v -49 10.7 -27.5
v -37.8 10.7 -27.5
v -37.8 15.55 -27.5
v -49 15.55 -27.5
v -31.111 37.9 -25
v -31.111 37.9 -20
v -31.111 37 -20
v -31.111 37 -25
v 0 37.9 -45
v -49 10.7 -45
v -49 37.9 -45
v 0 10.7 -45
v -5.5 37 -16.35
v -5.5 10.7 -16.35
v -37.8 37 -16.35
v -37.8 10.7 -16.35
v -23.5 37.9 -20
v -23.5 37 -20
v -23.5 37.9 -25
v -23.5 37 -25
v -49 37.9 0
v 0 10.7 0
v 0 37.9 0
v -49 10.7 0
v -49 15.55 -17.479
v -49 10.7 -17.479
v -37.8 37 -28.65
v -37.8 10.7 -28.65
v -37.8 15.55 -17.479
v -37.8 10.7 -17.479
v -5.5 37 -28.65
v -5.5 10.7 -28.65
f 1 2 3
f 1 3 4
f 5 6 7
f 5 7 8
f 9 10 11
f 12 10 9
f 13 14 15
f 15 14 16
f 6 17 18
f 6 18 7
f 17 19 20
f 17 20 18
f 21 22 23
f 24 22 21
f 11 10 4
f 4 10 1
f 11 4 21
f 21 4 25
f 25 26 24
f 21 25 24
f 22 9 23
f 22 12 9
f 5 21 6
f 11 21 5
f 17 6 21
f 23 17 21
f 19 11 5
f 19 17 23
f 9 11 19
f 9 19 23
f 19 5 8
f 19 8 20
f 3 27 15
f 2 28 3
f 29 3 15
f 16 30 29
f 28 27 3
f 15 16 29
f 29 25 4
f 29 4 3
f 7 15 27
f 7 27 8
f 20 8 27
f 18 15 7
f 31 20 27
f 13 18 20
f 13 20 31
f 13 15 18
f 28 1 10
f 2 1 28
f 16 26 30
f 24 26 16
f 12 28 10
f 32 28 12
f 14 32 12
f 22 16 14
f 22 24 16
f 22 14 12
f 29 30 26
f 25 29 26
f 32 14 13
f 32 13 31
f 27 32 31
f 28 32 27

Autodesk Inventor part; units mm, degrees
ref_plane "YZ Plane" through (0, 0, 0) normal (1, 0, 0) x (0, 1, 0)
ref_plane "XZ Plane" through (0, 0, 0) normal (0, 1, 0) x (-1, 0, 0)
ref_plane "XY Plane" through (0, 0, 0) normal (0, 0, 1) x (1, 0, 0)
sketch "Szkic1" plane through (0, 0, 0) normal (0, 1, 0) x (-1, 0, 0)
  line L0 (0, 0) -> (49, 0)
  line L1 (49, 0) -> (49, -45)
  line L2 (49, -45) -> (0, -45)
  line L3 (0, -45) -> (0, 0)
  line L4 (49, 0) -> (49, 3)
  line L5 (49, 3) -> (52, 3)
  line L6 (0, -45) -> (0, -48)
  line L7 (0, -48) -> (-3, -48)
  line L8 (-3, -48) -> (52, -48)
  line L9 (52, -48) -> (52, 3)
  line L10 (52, 3) -> (-3, 3)
  line L11 (-3, 3) -> (-3, -48)
  line L12 (0, -48) -> (-29.5685, -48)
  line L13 (-29.5685, -48) -> (-29.5685, 3)
  line L14 (-29.5685, 3) -> (0, 3)
  line L15 (0, 3) -> (0, -48)
  line L16 (-3, -45) -> (-29.5685, -45)
  line L17 (-3, 0) -> (-29.5685, 0)
  line L18 (-3, 0) -> (0, 0)
  line L19 (0, -45) -> (-3, -45)
  line L20 (-3, -45) -> (-3, -48)
  line L21 (0, -48) -> (0, -45)
  line L22 (0, -48) -> (-3, -48)
  dimension "d0" = 49
  dimension "d1" = 45
  dimension "d2" = 3
  dimension "d3" = 3
  dimension "d4" = 3
  dimension "d5" = 3
extrude "Wyciągnięcie proste1" add sketch "Szkic1" along normal blind 37.2 contours L0 L1 L2 L3 | L3 L19 L11 L18 | L11 L16 L13 L17
sketch "Szkic2" plane through (0, 0, 0) normal (0, -1, 0) x (1, 0, 0)
  line L0 (-49, 0) -> (0, 0) projected
  line L1 (-24.5, 0) -> (-24.5, -45)
  line L2 (0, -45) -> (-49, -45) projected
  line L3 (-49, -45) -> (-49, 0) projected
  line L4 (-49, -22.5) -> (0, -22.5)
  line L5 (0, 0) -> (0, -45) projected
  circle A0 centre (-24.5, -22.5) radius 2.85
  circle A1 centre (-24.5, -22.5) radius 3
  dimension "d8" = 5.7
  dimension "d27" = 6
extrude "Wyciągnięcie proste2" cut sketch "Szkic2" against normal through all contours A1 L4 A0 L1 | L1 A0 L4 A1 | L4 A0 L1 A1 | A0 L4 L1 | L1 L4 A0 | A1 L1 A0 L4 | L4 L1 A0 | L4 A0 L1
sketch "Szkic3" plane through (0, 0, 0) normal (0, -1, 0) x (1, 0, 0)
  circle A0 centre (-24.5, -22.5) radius 2.85 projected
  line L0 (-24.5, -22.5) -> (-37.8, -22.5)
  line L1 (-24.5, -22.5) -> (9, -22.5)
  line L2 (-37.8, -22.5) -> (9, -22.5)
  line L3 (9, -22.5) -> (9, -32.4)
  line L4 (9, -32.4) -> (-37.8, -32.4)
  line L5 (-37.8, -32.4) -> (-37.8, -22.5)
  line L6 (9, -22.5) -> (-37.8, -22.5)
  line L7 (-37.8, -22.5) -> (-37.8, -13.6)
  line L8 (-37.8, -13.6) -> (9, -13.6)
  line L9 (9, -13.6) -> (9, -22.5)
  line L10 (9, -32.4) -> (-37.8, -32.4)
  line L11 (9, -32.4) -> (13, -32.4)
  line L12 (-37.8, -13.6) -> (-41.8, -13.6)
  line L13 (13, -32.4) -> (13, -32.9)
  line L14 (-41.8, -13.6) -> (-41.8, -13)
  line L15 (13, -32.4) -> (13, -33)
  line L16 (-41.8, -13) -> (-42.5873, -13)
  line L17 (13, -33) -> (13.5, -33)
  line L18 (13.5, -33) -> (-42.5873, -33)
  line L19 (-42.5873, -33) -> (-42.5873, -13)
  line L20 (-42.5873, -13) -> (13.5, -13)
  line L21 (13.5, -13) -> (13.5, -33)
  line L22 (13.5, -13) -> (-6.5, -13)
  line L23 (-6.5, -13) -> (-6.5, -32.4)
  line L24 (-6.5, -32.4) -> (13.5, -32.4)
  line L25 (13.5, -32.4) -> (13.5, -13)
  line L26 (-37.8, -22.5) -> (-6.5, -22.5)
  line L27 (-6.5, -22.5) -> (-6.5, -16.35)
  line L28 (-6.5, -16.35) -> (-37.8, -16.35)
  line L29 (-37.8, -16.35) -> (-37.8, -22.5)
  line L30 (-37.8, -22.5) -> (-6.5, -22.5)
  line L31 (-6.5, -22.5) -> (-6.5, -28.65)
  line L32 (-6.5, -28.65) -> (-37.8, -28.65)
  line L33 (-37.8, -28.65) -> (-37.8, -22.5)
  line L34 (-6.5, -16.35) -> (-5.5, -16.35)
  line L35 (-5.5, -16.35) -> (-5.5, -28.65)
  line L36 (-5.5, -28.65) -> (-6.5, -28.65)
  line L37 (-6.5, -28.65) -> (-6.5, -16.35)
  line L38 (-37.8, -22.5) -> (-26.4, -22.5)
  line L39 (-24.5, -22.5) -> (-26.9, -22.5)
  circle A1 centre (-26.9, -22.5) radius 2.4
  point P0 (0, 0)
  dimension "d21" = 4
  dimension "d22" = 4
  dimension "d23" = 0.5
  dimension "d24" = 0.6
  dimension "d25" = 0.6
  dimension "d26" = 0.5
  dimension "d28" = 20
  dimension "d29" = 6.15
  dimension "d30" = 6.15
  dimension "d31" = 1
  dimension "d32" = 11.4
  dimension "d33" = 2.4
  dimension "d34" = 4.8
extrude "Wyciągnięcie proste3" cut sketch "Szkic3" against normal blind 37 contours L1 L23 L32 L5 L0 A1 A0 | A0 A1 L0 L7 L28 L23 L1 | A0 L0 A1 | A1 L0 A0 | L23 L34 L35 L1 | L1 L35 L36 L23 | L24 L21 L17 L15 L13 picked at (-27.9524, -22.0946) picked at (-27.9524, -22.9054)
sketch "Szkic4" plane through (0, 0, 0) normal (0, -1, 0) x (1, 0, 0)
  line L0 (-49, -45) -> (-49, 0) projected
  line L1 (-37.8, -28.65) -> (-37.8, -16.35) projected
  line L2 (-49, -22.5) -> (-37.8, -22.5)
  line L3 (-37.8, -22.5) -> (-37.8, -17.5)
  line L4 (-37.8, -17.5) -> (-49, -17.5)
  line L5 (-49, -17.5) -> (-49, -22.5)
  line L6 (-49, -22.5) -> (-37.8, -22.5)
  line L7 (-37.8, -22.5) -> (-37.8, -27.5)
  line L8 (-37.8, -27.5) -> (-49, -27.5)
  line L9 (-49, -27.5) -> (-49, -22.5)
  point P0 (0, 0)
  point P1 (-37.8, -32.4)
  point P2 (-37.8, -13.6)
  dimension "d17" = 5
  dimension "d18" = 5
extrude "Wyciągnięcie proste4" cut sketch "Szkic4" against normal blind 10
sketch "Szkic5" plane through (0, 37, 0) normal (0, -1, 0) x (1, 0, 0)
  line L0 (-37.8, -28.65) -> (-37.8, -16.35) projected
  line L1 (-37.8, -22.5) -> (-26.3, -22.5)
  line L2 (-26.3, -22.5) -> (-28.7, -22.5)
  circle A0 centre (-28.7, -22.5) radius 2.4
  point P0 (0, 0)
  dimension "d35" = 11.5
  dimension "d36" = 2.4
  dimension "d37" = 4.8
extrude "Wyciągnięcie proste5" cut sketch "Szkic5" against normal blind 37
sketch "Szkic6" plane through (0, 37, 0) normal (0, -1, 0) x (1, 0, 0)
  arc A0 (-26.9857, -20.8203) -> (-26.9857, -24.1797) centre (-28.7, -22.5) ccw projected
  circle A1 centre (-28.7, -22.5) radius 2.4
  arc A2 (-26.9857, -24.1797) -> (-26.9857, -20.8203) centre (-24.5, -22.5) ccw projected
  circle A3 centre (-24.5, -22.5) radius 3
  point P0 (0, 0)
extrude "Wyciągnięcie proste6" add sketch "Szkic6" against normal blind 0.2 contours A2 A1
sketch "Szkic7" plane through (0, 0, 0) normal (0, -1, 0) x (1, 0, 0)
  line L0 (-49, 0) -> (29.5685, 0) projected
  line L1 (-49, 0) -> (0, 0)
  line L2 (29.5685, 0) -> (29.5685, -45) projected
  line L3 (0, 0) -> (29.5685, 0)
  line L4 (29.5685, 0) -> (29.5685, -45)
  line L5 (29.5685, -45) -> (0, -45)
  line L6 (0, -45) -> (0, 0)
  dimension "d42" = 49
extrude "Wyciągnięcie proste7" cut sketch "Szkic7" against normal through all
sketch "Szkic8" plane through (0, 0, 0) normal (0, -1, 0) x (1, 0, 0)
  line L0 (-49, -45) -> (-49, 0) projected
  line L1 (0, 0) -> (0, -45) projected
  line L2 (-49, 0) -> (0, 0)
  line L3 (0, 0) -> (0, -45)
  line L4 (0, -45) -> (-49, -45)
  line L5 (-49, -45) -> (-49, 0)
sketch "Szkic9" plane through (-49, 0, 0) normal (0, 0, 1) x (1, 0, 0)
  line L0 (0, 37.2) -> (0, 9.2)
  line L1 (0, 0) -> (0, 37.2) projected
  point P0 (49, 0)
  dimension "d45" = 28
extrude "Wyciągnięcie proste8" cut sketch "Szkic8" against normal blind 9.2
sketch "Szkic10" plane through (0, 10, 0) normal (0, -1, 0) x (1, 0, 0)
  line L0 (-49, -45) -> (-49, -27.5) projected
  line L1 (-37.8, -28.65) -> (-37.8, -16.35) projected
  line L2 (-49, -27.5) -> (-37.8, -27.5)
  line L3 (-37.8, -27.5) -> (-37.8, -17.4794)
  line L4 (-37.8, -17.4794) -> (-49, -17.4794)
  line L5 (-49, -17.4794) -> (-49, -27.5)
  point P0 (0, 0)
extrude "Wyciągnięcie proste9" cut sketch "Szkic10" against normal blind 5.55
sketch "Szkic11" plane through (0, 37.2, 0) normal (0, 1, 0) x (1, 0, 0)
  circle A0 centre (-28.7, 22.5) radius 2.4 projected
  circle A1 centre (-28.7, 22.5) radius 2.4
  line L0 (-49, 45) -> (-49, 27.5) projected
  line L1 (0, 0) -> (-49, 0)
  line L2 (-49, 0) -> (-49, 45)
  line L3 (-49, 45) -> (0, 45)
  line L4 (0, 45) -> (0, 0)
extrude "Wyciągnięcie proste10" add sketch "Szkic11" along normal blind 1
sketch "Szkic12" plane through (0, 9.2, 0) normal (0, -1, 0) x (1, 0, 0)
  line L0 (0, -45) -> (-49, -45) projected
  line L1 (-49, 0) -> (0, 0)
  line L2 (0, 0) -> (0, -45)
  line L3 (0, -45) -> (-49, -45)
  line L4 (-49, -45) -> (-49, 0)
extrude "Wyciągnięcie proste11" cut sketch "Szkic12" against normal blind 1.5
sketch "Szkic13" plane through (0, 38.2, 0) normal (0, 1, 0) x (1, 0, 0)
  line L0 (-49, 45) -> (-49, 0) projected
  line L1 (-49, 22.5) -> (-26, 22.5)
  line L2 (-26, 22.5) -> (-28.4, 22.5)
  circle A0 centre (-28.4, 22.5) radius 2.5
  circle A1 centre (-26, 22.5) radius 2.5
  circle A2 centre (-27.2, 22.5) radius 2.5
  line L3 (-23.5, 20) -> (-31.1111, 20)
  line L4 (-31.1111, 20) -> (-31.1111, 25)
  line L5 (-31.1111, 25) -> (-23.5, 25)
  line L6 (-23.5, 25) -> (-23.5, 20)
  point P0 (0, 0)
  dimension "d54" = 23
  dimension "d55" = 2.4
  dimension "d56" = 5
  dimension "d57" = 5
  dimension "d58" = 5
extrude "Wyciągnięcie proste12" cut sketch "Szkic13" against normal blind 1.5
sketch "Szkic14" plane through (0, 38.2, 0) normal (0, 1, 0) x (1, 0, 0)
  line L0 (-54.5366, 52.5987) -> (6.0904, 52.5987)
  line L1 (6.0904, 52.5987) -> (6.0904, -5.7213)
  line L2 (6.0904, -5.7213) -> (-54.5366, -5.7213)
  line L3 (-54.5366, -5.7213) -> (-54.5366, 52.5987)
  point P0 (0, 0)
extrude "Wyciągnięcie proste13" cut sketch "Szkic14" against normal blind 0.3
